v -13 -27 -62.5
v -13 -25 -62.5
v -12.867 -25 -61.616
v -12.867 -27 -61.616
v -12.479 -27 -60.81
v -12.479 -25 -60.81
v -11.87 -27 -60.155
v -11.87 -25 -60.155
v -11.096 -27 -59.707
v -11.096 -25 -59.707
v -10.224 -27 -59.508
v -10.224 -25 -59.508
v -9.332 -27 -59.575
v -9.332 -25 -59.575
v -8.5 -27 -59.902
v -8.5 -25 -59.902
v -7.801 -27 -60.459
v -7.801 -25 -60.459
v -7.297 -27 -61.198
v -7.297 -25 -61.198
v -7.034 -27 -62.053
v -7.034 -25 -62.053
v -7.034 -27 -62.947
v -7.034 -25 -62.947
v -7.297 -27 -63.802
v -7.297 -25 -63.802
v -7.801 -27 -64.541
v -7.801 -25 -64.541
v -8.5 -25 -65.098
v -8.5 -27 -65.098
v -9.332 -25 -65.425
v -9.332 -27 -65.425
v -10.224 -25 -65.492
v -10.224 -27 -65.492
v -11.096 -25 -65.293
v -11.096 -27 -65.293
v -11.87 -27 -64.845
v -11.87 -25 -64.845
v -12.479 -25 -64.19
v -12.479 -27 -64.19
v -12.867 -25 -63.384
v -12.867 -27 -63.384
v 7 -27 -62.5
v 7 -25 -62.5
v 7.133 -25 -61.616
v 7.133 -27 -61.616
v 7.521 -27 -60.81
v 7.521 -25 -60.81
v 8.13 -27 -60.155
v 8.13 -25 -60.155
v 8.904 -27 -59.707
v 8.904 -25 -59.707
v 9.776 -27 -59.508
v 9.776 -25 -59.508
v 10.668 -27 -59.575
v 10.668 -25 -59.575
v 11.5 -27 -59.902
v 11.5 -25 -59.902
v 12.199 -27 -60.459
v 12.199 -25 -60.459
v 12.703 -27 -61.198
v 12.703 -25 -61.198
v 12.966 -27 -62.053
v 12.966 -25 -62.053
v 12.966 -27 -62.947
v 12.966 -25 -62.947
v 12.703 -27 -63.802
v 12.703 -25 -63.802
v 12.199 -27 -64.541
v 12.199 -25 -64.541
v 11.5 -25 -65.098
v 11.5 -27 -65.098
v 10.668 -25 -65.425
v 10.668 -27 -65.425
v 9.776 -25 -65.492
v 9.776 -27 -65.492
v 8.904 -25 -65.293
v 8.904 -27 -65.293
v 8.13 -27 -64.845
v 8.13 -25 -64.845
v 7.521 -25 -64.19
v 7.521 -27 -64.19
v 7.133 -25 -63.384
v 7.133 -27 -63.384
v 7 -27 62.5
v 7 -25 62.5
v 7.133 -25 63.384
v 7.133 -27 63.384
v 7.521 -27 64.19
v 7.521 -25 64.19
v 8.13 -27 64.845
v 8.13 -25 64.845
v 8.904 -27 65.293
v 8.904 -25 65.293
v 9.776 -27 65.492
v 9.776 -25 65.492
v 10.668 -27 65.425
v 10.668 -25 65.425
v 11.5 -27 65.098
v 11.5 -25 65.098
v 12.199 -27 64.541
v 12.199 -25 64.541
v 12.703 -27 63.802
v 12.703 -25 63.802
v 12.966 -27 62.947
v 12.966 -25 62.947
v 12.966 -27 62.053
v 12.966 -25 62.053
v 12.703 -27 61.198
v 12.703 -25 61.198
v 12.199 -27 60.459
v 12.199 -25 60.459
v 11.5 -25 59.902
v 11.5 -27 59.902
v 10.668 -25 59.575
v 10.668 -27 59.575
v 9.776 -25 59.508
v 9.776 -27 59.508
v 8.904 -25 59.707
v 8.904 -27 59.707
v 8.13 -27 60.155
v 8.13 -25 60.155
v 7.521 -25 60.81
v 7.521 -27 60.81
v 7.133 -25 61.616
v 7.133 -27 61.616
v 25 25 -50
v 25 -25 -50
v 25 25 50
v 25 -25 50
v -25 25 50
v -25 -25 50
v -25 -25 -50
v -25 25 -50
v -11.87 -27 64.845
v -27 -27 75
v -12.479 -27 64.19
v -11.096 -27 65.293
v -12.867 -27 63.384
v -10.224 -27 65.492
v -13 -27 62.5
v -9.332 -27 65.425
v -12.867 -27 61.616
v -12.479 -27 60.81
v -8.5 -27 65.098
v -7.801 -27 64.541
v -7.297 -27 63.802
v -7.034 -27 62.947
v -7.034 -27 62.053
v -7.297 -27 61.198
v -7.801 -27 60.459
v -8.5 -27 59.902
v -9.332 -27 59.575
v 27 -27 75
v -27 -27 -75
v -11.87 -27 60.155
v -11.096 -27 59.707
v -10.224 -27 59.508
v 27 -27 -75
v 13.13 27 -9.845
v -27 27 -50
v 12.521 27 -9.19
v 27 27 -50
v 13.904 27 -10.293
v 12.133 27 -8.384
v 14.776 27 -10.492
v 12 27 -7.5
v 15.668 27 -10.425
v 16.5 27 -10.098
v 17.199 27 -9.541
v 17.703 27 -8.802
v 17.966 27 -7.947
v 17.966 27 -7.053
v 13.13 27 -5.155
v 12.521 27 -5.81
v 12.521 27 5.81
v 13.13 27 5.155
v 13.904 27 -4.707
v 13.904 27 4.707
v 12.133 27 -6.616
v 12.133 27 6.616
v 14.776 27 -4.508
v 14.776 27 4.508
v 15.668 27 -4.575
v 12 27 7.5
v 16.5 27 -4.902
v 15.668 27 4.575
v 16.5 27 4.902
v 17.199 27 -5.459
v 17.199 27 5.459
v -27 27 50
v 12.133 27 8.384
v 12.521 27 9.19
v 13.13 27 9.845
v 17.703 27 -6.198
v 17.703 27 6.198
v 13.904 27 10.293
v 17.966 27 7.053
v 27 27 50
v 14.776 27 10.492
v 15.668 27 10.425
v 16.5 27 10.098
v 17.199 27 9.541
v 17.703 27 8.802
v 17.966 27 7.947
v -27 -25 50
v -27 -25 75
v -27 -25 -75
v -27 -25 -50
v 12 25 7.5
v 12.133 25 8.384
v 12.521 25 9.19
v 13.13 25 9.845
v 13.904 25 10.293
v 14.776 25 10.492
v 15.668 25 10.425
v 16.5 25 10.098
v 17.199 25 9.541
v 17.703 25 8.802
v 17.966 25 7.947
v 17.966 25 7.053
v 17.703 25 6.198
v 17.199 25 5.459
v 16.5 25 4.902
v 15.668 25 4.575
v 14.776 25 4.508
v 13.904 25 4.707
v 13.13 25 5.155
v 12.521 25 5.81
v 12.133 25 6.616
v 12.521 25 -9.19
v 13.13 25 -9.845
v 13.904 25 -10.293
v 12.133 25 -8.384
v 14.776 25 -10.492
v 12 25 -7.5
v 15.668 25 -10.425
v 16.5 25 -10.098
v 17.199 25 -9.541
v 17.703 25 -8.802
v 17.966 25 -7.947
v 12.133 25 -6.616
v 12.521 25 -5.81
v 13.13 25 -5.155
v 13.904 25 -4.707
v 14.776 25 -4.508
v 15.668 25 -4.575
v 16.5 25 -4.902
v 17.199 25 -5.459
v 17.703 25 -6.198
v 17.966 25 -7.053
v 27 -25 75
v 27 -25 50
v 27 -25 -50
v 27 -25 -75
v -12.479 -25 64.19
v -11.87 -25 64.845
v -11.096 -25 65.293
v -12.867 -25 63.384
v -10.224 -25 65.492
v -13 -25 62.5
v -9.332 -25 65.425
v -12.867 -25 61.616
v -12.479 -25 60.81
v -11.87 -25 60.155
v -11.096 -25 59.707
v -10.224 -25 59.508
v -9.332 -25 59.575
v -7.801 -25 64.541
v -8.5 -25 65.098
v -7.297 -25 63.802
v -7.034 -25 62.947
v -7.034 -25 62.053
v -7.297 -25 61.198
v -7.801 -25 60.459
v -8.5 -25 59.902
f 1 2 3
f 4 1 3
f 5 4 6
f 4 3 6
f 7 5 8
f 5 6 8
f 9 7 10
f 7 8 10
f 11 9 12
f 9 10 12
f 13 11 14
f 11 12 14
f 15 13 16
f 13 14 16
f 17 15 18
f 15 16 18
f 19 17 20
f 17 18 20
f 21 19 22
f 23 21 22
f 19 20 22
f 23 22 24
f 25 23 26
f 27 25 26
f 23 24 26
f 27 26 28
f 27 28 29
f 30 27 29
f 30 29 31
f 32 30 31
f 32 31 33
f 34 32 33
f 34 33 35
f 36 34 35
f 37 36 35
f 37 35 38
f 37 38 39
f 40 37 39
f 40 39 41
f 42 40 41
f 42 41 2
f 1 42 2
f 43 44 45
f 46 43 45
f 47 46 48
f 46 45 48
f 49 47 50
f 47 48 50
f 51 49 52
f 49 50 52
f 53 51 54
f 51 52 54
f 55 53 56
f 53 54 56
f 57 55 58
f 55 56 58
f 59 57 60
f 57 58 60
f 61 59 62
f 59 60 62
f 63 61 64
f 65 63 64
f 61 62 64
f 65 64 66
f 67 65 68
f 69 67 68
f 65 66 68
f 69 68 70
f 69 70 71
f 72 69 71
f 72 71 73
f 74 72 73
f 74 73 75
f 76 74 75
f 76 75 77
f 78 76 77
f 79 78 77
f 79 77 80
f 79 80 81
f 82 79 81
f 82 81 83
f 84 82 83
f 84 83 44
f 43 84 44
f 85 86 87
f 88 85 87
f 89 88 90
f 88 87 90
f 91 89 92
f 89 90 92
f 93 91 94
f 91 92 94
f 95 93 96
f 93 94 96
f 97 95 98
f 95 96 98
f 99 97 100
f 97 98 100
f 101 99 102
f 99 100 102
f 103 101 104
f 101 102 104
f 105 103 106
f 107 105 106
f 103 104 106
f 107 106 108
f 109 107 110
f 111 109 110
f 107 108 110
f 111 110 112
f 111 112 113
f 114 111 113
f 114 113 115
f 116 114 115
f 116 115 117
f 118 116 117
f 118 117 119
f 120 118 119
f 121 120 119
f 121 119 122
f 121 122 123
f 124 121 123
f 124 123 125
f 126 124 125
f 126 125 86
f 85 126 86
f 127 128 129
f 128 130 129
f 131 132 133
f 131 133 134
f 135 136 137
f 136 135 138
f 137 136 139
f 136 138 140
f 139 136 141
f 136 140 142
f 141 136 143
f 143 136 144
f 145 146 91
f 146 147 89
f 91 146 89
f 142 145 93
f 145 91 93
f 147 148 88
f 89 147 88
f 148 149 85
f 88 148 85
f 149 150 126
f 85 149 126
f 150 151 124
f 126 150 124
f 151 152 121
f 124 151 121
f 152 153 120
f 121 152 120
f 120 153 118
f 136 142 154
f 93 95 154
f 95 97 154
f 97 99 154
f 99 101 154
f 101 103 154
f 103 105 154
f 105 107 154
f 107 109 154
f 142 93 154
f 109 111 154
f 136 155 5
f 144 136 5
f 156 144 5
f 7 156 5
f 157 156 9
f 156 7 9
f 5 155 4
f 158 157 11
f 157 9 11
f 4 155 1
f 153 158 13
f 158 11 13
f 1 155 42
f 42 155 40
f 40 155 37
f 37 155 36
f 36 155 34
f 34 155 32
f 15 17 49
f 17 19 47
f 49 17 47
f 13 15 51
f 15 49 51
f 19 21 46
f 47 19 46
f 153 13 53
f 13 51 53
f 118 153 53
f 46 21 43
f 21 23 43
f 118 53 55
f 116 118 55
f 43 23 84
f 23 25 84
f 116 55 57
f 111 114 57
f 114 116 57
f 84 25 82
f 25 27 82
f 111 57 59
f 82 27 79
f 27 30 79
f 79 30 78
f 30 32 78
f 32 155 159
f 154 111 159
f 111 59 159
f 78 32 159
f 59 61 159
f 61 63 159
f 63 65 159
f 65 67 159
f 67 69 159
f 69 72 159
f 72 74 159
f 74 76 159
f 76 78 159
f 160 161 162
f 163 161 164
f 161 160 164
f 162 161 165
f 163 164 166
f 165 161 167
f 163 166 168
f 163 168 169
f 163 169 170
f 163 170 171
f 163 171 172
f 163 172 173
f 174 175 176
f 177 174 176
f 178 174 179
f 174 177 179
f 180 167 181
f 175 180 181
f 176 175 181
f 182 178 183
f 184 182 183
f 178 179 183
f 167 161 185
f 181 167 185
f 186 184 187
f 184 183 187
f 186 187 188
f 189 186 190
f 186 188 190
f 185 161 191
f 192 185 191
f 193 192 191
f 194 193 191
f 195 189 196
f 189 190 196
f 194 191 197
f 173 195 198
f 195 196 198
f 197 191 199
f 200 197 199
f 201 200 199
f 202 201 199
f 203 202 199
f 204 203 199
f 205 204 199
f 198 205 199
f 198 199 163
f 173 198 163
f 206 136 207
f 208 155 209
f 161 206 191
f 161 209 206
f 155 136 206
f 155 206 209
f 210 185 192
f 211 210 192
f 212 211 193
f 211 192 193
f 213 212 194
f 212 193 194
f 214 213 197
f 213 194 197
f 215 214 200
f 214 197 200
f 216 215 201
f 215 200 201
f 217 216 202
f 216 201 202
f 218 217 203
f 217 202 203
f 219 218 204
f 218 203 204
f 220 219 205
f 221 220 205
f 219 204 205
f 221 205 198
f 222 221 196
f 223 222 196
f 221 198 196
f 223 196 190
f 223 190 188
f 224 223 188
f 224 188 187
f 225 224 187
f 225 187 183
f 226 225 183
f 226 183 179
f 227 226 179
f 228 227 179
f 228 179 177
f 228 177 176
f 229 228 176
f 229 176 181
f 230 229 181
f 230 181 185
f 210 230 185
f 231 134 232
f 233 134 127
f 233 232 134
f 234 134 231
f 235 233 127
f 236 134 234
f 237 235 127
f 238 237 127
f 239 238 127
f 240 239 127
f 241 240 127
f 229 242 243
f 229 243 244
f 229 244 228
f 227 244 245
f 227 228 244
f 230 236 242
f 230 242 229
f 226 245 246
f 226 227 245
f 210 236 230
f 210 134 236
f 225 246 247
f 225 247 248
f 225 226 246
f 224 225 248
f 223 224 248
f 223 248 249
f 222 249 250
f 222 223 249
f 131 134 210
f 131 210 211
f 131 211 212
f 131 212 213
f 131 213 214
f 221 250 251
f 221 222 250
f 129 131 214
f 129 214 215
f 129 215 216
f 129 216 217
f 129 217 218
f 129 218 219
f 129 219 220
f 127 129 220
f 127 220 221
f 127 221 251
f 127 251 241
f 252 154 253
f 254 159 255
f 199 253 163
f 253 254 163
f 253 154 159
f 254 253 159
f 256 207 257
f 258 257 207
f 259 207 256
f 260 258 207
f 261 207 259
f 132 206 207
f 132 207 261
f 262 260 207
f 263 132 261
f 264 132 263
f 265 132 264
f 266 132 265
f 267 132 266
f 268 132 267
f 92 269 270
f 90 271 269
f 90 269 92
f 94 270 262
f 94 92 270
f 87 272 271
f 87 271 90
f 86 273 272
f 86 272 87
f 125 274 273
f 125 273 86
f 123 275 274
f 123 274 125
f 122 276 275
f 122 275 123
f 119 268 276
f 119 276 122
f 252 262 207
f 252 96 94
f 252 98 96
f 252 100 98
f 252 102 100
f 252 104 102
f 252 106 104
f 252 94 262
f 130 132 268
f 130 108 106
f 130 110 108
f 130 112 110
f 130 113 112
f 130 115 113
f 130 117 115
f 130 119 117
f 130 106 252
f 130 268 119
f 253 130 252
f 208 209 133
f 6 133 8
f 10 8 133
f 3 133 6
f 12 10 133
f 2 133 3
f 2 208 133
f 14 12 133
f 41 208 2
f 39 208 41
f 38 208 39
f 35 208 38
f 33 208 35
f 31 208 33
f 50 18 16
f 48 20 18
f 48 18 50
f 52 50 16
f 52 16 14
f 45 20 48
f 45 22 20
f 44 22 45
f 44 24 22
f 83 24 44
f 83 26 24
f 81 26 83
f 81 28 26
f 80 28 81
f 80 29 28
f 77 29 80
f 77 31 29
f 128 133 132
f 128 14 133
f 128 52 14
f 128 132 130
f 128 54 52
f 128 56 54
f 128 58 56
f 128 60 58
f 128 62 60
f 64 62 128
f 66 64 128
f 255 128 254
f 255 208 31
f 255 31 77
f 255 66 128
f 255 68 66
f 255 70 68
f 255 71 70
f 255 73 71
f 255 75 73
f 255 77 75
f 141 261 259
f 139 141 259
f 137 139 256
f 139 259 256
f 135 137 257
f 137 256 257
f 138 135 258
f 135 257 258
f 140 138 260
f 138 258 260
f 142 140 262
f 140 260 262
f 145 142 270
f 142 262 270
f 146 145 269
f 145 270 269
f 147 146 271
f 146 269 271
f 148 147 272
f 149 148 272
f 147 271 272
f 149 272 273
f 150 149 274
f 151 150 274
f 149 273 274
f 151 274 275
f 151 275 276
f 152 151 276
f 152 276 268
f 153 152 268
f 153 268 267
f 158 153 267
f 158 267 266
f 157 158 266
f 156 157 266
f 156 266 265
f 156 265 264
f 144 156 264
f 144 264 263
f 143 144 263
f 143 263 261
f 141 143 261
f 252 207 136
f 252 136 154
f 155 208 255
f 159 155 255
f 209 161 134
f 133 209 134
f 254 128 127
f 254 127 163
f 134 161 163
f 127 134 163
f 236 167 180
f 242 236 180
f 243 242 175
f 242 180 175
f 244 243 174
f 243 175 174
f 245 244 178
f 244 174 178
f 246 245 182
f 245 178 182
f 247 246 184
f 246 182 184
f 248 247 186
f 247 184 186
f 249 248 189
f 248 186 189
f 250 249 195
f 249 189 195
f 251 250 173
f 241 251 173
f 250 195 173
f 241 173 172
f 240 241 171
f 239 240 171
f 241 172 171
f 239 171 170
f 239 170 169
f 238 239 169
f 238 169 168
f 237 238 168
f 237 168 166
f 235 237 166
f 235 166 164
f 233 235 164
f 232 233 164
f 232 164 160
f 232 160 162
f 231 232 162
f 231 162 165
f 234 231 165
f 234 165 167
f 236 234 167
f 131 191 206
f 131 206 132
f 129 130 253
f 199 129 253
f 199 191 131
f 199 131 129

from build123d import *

# Parameters (mm, degrees)
SKETCH1_W                = 54
SKETCH1_H                = 54
SKETCH1_W_2              = 50
SKETCH1_H_2              = 50
BOSS_EXTRUDE1_DEPTH      = 50
BOSS_EXTRUDE2_DEPTH      = 25
BOSS_EXTRUDE2_DEPTH_BACK = 125
SKETCH2_W                = 54
SKETCH2_H                = 2
SKETCH3_R                = 3
CUT_EXTRUDE1_DEPTH       = 25
SKETCH4_R                = 3
CUT_EXTRUDE2_DEPTH       = 25


with BuildPart() as part:
    # Sketch1 → Boss-Extrude1 (new, symmetric)
    with BuildSketch(Plane.XY):
        Rectangle(SKETCH1_W, SKETCH1_H)
        Rectangle(SKETCH1_W_2, SKETCH1_H_2, mode=Mode.SUBTRACT)
    extrude(amount=BOSS_EXTRUDE1_DEPTH, both=True)

    # Sketch2 → Boss-Extrude2 (add, two sides: drawn at the far end of the back side and taken through both)
    with BuildSketch(Plane.XY.offset(50).offset(-BOSS_EXTRUDE2_DEPTH_BACK)):
        with Locations((0, -26)):
            Rectangle(SKETCH2_W, SKETCH2_H)
    extrude(amount=BOSS_EXTRUDE2_DEPTH + BOSS_EXTRUDE2_DEPTH_BACK)

    # Sketch3 → Cut-Extrude1 (cut)
    with BuildSketch(Plane(origin=(0, -25, 0), x_dir=(1, 0, 0), z_dir=(0, 1, 0))):
        with Locations(Location((-10, -62.5, 0), (0, 0, 180))):
            Circle(SKETCH3_R)
        with Locations(Location((10, -62.5, 0), (0, 0, 180))):
            Circle(SKETCH3_R)
        with Locations(Location((10, 62.5, 0), (0, 0, 180))):
            Circle(SKETCH3_R)
        with Locations(Location((-10, 62.5, 0), (0, 0, 180))):
            Circle(SKETCH3_R)
    extrude(amount=-CUT_EXTRUDE1_DEPTH, mode=Mode.SUBTRACT)

    # Sketch4 → Cut-Extrude2 (cut)
    with BuildSketch(Plane(origin=(0, 27, 0), x_dir=(1, 0, 0), z_dir=(0, 1, 0))):
        with Locations(Location((15, 7.5, 0), (0, 0, 180))):
            Circle(SKETCH4_R)
        with Locations(Location((15, -7.5, 0), (0, 0, 180))):
            Circle(SKETCH4_R)
    extrude(amount=-CUT_EXTRUDE2_DEPTH, mode=Mode.SUBTRACT)


solid = part.part
